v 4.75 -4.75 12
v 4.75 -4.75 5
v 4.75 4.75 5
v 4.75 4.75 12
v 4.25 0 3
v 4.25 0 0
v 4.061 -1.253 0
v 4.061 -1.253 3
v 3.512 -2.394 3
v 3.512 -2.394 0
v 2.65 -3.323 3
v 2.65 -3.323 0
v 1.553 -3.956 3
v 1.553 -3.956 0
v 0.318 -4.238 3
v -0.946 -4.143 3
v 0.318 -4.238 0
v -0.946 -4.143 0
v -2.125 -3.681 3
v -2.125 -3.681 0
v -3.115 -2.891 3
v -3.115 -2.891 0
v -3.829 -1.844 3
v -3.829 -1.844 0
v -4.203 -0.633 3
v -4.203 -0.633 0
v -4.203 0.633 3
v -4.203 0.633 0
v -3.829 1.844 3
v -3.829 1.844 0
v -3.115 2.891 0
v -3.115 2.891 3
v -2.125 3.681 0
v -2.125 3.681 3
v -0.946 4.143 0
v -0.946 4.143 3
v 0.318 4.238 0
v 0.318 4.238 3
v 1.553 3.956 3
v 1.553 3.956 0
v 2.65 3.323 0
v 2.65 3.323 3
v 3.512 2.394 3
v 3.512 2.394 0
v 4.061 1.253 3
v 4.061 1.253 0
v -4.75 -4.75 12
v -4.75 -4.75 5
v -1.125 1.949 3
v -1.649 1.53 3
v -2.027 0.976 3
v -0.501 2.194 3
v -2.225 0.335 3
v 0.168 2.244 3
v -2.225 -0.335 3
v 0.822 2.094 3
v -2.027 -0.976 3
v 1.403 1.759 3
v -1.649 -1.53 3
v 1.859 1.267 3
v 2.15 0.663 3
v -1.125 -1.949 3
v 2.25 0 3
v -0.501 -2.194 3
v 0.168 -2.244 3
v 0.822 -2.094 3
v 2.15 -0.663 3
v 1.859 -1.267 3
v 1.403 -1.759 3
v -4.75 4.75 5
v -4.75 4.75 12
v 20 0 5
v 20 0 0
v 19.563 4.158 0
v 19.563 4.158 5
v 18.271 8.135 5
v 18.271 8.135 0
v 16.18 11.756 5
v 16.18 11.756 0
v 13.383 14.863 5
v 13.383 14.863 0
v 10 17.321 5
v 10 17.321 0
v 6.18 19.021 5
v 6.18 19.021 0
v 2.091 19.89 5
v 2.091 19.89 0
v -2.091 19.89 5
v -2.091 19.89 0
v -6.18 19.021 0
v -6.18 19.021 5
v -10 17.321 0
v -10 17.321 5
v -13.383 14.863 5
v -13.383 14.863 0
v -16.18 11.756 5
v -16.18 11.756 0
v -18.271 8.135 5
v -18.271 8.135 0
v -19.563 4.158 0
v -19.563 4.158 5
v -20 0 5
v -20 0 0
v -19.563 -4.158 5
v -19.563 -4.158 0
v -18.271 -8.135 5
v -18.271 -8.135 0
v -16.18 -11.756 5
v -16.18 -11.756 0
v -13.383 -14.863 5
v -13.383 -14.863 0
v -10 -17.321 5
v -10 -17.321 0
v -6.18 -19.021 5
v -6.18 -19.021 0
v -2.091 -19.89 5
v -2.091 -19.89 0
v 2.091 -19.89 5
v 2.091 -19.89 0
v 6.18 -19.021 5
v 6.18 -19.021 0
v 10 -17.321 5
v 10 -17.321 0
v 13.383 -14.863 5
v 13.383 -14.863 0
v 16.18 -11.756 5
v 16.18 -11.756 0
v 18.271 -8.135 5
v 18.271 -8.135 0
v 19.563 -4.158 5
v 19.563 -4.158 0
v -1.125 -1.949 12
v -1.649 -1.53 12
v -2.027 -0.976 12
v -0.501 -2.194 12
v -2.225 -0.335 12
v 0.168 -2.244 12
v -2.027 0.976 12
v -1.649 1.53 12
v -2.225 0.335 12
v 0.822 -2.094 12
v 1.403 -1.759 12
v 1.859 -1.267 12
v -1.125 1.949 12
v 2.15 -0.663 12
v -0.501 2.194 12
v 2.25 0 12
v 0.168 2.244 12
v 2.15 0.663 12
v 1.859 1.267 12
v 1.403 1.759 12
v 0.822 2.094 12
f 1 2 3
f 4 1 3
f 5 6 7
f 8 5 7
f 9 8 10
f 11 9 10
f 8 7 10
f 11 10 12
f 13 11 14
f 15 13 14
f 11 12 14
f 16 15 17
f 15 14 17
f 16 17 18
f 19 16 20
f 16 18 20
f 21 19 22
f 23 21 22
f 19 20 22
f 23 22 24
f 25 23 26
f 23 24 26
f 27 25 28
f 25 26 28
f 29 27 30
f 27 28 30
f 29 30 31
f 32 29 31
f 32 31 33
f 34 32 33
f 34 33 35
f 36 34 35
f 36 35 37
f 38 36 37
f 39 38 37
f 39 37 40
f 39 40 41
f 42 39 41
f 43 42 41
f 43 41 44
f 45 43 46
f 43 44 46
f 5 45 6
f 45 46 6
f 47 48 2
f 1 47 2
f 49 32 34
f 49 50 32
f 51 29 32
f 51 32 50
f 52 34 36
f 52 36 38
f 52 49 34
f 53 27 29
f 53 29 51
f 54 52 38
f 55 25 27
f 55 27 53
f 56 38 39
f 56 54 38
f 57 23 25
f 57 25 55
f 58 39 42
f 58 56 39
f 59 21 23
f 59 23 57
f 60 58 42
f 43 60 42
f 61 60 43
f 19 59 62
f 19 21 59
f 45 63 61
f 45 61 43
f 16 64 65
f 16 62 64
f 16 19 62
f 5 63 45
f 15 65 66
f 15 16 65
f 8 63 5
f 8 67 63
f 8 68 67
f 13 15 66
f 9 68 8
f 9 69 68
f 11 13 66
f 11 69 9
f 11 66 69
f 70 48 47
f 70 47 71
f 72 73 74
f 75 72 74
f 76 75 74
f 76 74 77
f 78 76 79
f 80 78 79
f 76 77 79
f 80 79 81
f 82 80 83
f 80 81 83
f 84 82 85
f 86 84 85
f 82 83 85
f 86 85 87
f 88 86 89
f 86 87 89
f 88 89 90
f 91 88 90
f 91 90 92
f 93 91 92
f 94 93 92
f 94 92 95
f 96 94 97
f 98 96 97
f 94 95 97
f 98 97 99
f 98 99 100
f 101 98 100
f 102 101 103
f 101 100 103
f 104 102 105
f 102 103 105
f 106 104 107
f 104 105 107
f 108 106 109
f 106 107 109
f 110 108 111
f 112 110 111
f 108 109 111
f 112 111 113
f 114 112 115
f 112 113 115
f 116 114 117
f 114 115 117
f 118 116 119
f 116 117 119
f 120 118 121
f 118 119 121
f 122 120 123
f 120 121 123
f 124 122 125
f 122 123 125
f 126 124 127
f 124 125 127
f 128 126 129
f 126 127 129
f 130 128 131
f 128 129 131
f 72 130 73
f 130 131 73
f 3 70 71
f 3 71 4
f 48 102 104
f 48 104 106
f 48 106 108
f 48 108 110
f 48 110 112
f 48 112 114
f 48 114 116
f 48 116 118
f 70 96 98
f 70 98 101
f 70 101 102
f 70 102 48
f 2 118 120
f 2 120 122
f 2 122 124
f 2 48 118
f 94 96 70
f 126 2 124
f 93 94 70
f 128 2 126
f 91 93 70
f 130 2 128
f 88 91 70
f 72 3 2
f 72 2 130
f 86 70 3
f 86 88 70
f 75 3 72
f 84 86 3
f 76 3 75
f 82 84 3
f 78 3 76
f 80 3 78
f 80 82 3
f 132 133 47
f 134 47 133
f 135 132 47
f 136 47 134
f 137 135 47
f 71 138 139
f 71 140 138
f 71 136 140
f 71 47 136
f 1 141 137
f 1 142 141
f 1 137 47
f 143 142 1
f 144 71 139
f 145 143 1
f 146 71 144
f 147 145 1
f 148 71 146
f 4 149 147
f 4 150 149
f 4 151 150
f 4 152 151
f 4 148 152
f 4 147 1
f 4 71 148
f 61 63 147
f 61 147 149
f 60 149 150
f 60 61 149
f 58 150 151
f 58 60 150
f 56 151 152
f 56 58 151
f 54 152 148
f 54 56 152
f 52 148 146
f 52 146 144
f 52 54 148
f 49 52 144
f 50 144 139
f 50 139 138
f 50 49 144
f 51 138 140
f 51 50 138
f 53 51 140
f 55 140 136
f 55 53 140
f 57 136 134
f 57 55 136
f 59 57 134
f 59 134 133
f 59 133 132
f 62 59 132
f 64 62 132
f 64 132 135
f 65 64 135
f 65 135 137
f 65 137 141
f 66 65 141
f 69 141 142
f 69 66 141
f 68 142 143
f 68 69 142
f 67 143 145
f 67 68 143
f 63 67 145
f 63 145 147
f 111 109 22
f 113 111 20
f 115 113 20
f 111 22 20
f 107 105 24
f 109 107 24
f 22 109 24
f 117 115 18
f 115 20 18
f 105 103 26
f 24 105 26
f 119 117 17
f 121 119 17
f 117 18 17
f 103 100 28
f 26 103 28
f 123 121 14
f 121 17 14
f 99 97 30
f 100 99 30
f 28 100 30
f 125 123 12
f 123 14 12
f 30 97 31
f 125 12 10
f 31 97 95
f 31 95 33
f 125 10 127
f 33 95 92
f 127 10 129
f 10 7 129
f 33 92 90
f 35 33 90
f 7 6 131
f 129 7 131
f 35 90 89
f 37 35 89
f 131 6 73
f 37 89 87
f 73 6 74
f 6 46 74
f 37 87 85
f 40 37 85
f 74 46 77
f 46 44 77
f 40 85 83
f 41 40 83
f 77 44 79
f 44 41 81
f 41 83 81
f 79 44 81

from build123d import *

# Parameters (mm, degrees)
F0_R     = 20
F0_R_2   = 2.25
F1_DEPTH = 5
F2_W     = 9.5
F2_H     = 9.5
F2_R     = 2.25
F3_DEPTH = 7
F4_R     = 4.25
F4_R_2   = 2.25
F5_DEPTH = 3


with BuildPart() as f1:
    # F0 (on Top) → F1 (new body)
    with BuildSketch(Plane.XY):
        Circle(F0_R)
        Circle(F0_R_2, mode=Mode.SUBTRACT)
    extrude(amount=F1_DEPTH)

    # F2 (on face) → F3 (join)
    with BuildSketch(Plane.XY.offset(5)):
        Rectangle(F2_W, F2_H)
        Circle(F2_R, mode=Mode.SUBTRACT)
    extrude(amount=F3_DEPTH)

    # F4 (on face) → F5 (cut)
    with BuildSketch(Plane(origin=(0, 0, 0), x_dir=(1, 0, 0), z_dir=(0, 0, -1))):
        Circle(F4_R)
        Circle(F4_R_2, mode=Mode.SUBTRACT)
    extrude(amount=-F5_DEPTH, mode=Mode.SUBTRACT)


solid = f1.part
